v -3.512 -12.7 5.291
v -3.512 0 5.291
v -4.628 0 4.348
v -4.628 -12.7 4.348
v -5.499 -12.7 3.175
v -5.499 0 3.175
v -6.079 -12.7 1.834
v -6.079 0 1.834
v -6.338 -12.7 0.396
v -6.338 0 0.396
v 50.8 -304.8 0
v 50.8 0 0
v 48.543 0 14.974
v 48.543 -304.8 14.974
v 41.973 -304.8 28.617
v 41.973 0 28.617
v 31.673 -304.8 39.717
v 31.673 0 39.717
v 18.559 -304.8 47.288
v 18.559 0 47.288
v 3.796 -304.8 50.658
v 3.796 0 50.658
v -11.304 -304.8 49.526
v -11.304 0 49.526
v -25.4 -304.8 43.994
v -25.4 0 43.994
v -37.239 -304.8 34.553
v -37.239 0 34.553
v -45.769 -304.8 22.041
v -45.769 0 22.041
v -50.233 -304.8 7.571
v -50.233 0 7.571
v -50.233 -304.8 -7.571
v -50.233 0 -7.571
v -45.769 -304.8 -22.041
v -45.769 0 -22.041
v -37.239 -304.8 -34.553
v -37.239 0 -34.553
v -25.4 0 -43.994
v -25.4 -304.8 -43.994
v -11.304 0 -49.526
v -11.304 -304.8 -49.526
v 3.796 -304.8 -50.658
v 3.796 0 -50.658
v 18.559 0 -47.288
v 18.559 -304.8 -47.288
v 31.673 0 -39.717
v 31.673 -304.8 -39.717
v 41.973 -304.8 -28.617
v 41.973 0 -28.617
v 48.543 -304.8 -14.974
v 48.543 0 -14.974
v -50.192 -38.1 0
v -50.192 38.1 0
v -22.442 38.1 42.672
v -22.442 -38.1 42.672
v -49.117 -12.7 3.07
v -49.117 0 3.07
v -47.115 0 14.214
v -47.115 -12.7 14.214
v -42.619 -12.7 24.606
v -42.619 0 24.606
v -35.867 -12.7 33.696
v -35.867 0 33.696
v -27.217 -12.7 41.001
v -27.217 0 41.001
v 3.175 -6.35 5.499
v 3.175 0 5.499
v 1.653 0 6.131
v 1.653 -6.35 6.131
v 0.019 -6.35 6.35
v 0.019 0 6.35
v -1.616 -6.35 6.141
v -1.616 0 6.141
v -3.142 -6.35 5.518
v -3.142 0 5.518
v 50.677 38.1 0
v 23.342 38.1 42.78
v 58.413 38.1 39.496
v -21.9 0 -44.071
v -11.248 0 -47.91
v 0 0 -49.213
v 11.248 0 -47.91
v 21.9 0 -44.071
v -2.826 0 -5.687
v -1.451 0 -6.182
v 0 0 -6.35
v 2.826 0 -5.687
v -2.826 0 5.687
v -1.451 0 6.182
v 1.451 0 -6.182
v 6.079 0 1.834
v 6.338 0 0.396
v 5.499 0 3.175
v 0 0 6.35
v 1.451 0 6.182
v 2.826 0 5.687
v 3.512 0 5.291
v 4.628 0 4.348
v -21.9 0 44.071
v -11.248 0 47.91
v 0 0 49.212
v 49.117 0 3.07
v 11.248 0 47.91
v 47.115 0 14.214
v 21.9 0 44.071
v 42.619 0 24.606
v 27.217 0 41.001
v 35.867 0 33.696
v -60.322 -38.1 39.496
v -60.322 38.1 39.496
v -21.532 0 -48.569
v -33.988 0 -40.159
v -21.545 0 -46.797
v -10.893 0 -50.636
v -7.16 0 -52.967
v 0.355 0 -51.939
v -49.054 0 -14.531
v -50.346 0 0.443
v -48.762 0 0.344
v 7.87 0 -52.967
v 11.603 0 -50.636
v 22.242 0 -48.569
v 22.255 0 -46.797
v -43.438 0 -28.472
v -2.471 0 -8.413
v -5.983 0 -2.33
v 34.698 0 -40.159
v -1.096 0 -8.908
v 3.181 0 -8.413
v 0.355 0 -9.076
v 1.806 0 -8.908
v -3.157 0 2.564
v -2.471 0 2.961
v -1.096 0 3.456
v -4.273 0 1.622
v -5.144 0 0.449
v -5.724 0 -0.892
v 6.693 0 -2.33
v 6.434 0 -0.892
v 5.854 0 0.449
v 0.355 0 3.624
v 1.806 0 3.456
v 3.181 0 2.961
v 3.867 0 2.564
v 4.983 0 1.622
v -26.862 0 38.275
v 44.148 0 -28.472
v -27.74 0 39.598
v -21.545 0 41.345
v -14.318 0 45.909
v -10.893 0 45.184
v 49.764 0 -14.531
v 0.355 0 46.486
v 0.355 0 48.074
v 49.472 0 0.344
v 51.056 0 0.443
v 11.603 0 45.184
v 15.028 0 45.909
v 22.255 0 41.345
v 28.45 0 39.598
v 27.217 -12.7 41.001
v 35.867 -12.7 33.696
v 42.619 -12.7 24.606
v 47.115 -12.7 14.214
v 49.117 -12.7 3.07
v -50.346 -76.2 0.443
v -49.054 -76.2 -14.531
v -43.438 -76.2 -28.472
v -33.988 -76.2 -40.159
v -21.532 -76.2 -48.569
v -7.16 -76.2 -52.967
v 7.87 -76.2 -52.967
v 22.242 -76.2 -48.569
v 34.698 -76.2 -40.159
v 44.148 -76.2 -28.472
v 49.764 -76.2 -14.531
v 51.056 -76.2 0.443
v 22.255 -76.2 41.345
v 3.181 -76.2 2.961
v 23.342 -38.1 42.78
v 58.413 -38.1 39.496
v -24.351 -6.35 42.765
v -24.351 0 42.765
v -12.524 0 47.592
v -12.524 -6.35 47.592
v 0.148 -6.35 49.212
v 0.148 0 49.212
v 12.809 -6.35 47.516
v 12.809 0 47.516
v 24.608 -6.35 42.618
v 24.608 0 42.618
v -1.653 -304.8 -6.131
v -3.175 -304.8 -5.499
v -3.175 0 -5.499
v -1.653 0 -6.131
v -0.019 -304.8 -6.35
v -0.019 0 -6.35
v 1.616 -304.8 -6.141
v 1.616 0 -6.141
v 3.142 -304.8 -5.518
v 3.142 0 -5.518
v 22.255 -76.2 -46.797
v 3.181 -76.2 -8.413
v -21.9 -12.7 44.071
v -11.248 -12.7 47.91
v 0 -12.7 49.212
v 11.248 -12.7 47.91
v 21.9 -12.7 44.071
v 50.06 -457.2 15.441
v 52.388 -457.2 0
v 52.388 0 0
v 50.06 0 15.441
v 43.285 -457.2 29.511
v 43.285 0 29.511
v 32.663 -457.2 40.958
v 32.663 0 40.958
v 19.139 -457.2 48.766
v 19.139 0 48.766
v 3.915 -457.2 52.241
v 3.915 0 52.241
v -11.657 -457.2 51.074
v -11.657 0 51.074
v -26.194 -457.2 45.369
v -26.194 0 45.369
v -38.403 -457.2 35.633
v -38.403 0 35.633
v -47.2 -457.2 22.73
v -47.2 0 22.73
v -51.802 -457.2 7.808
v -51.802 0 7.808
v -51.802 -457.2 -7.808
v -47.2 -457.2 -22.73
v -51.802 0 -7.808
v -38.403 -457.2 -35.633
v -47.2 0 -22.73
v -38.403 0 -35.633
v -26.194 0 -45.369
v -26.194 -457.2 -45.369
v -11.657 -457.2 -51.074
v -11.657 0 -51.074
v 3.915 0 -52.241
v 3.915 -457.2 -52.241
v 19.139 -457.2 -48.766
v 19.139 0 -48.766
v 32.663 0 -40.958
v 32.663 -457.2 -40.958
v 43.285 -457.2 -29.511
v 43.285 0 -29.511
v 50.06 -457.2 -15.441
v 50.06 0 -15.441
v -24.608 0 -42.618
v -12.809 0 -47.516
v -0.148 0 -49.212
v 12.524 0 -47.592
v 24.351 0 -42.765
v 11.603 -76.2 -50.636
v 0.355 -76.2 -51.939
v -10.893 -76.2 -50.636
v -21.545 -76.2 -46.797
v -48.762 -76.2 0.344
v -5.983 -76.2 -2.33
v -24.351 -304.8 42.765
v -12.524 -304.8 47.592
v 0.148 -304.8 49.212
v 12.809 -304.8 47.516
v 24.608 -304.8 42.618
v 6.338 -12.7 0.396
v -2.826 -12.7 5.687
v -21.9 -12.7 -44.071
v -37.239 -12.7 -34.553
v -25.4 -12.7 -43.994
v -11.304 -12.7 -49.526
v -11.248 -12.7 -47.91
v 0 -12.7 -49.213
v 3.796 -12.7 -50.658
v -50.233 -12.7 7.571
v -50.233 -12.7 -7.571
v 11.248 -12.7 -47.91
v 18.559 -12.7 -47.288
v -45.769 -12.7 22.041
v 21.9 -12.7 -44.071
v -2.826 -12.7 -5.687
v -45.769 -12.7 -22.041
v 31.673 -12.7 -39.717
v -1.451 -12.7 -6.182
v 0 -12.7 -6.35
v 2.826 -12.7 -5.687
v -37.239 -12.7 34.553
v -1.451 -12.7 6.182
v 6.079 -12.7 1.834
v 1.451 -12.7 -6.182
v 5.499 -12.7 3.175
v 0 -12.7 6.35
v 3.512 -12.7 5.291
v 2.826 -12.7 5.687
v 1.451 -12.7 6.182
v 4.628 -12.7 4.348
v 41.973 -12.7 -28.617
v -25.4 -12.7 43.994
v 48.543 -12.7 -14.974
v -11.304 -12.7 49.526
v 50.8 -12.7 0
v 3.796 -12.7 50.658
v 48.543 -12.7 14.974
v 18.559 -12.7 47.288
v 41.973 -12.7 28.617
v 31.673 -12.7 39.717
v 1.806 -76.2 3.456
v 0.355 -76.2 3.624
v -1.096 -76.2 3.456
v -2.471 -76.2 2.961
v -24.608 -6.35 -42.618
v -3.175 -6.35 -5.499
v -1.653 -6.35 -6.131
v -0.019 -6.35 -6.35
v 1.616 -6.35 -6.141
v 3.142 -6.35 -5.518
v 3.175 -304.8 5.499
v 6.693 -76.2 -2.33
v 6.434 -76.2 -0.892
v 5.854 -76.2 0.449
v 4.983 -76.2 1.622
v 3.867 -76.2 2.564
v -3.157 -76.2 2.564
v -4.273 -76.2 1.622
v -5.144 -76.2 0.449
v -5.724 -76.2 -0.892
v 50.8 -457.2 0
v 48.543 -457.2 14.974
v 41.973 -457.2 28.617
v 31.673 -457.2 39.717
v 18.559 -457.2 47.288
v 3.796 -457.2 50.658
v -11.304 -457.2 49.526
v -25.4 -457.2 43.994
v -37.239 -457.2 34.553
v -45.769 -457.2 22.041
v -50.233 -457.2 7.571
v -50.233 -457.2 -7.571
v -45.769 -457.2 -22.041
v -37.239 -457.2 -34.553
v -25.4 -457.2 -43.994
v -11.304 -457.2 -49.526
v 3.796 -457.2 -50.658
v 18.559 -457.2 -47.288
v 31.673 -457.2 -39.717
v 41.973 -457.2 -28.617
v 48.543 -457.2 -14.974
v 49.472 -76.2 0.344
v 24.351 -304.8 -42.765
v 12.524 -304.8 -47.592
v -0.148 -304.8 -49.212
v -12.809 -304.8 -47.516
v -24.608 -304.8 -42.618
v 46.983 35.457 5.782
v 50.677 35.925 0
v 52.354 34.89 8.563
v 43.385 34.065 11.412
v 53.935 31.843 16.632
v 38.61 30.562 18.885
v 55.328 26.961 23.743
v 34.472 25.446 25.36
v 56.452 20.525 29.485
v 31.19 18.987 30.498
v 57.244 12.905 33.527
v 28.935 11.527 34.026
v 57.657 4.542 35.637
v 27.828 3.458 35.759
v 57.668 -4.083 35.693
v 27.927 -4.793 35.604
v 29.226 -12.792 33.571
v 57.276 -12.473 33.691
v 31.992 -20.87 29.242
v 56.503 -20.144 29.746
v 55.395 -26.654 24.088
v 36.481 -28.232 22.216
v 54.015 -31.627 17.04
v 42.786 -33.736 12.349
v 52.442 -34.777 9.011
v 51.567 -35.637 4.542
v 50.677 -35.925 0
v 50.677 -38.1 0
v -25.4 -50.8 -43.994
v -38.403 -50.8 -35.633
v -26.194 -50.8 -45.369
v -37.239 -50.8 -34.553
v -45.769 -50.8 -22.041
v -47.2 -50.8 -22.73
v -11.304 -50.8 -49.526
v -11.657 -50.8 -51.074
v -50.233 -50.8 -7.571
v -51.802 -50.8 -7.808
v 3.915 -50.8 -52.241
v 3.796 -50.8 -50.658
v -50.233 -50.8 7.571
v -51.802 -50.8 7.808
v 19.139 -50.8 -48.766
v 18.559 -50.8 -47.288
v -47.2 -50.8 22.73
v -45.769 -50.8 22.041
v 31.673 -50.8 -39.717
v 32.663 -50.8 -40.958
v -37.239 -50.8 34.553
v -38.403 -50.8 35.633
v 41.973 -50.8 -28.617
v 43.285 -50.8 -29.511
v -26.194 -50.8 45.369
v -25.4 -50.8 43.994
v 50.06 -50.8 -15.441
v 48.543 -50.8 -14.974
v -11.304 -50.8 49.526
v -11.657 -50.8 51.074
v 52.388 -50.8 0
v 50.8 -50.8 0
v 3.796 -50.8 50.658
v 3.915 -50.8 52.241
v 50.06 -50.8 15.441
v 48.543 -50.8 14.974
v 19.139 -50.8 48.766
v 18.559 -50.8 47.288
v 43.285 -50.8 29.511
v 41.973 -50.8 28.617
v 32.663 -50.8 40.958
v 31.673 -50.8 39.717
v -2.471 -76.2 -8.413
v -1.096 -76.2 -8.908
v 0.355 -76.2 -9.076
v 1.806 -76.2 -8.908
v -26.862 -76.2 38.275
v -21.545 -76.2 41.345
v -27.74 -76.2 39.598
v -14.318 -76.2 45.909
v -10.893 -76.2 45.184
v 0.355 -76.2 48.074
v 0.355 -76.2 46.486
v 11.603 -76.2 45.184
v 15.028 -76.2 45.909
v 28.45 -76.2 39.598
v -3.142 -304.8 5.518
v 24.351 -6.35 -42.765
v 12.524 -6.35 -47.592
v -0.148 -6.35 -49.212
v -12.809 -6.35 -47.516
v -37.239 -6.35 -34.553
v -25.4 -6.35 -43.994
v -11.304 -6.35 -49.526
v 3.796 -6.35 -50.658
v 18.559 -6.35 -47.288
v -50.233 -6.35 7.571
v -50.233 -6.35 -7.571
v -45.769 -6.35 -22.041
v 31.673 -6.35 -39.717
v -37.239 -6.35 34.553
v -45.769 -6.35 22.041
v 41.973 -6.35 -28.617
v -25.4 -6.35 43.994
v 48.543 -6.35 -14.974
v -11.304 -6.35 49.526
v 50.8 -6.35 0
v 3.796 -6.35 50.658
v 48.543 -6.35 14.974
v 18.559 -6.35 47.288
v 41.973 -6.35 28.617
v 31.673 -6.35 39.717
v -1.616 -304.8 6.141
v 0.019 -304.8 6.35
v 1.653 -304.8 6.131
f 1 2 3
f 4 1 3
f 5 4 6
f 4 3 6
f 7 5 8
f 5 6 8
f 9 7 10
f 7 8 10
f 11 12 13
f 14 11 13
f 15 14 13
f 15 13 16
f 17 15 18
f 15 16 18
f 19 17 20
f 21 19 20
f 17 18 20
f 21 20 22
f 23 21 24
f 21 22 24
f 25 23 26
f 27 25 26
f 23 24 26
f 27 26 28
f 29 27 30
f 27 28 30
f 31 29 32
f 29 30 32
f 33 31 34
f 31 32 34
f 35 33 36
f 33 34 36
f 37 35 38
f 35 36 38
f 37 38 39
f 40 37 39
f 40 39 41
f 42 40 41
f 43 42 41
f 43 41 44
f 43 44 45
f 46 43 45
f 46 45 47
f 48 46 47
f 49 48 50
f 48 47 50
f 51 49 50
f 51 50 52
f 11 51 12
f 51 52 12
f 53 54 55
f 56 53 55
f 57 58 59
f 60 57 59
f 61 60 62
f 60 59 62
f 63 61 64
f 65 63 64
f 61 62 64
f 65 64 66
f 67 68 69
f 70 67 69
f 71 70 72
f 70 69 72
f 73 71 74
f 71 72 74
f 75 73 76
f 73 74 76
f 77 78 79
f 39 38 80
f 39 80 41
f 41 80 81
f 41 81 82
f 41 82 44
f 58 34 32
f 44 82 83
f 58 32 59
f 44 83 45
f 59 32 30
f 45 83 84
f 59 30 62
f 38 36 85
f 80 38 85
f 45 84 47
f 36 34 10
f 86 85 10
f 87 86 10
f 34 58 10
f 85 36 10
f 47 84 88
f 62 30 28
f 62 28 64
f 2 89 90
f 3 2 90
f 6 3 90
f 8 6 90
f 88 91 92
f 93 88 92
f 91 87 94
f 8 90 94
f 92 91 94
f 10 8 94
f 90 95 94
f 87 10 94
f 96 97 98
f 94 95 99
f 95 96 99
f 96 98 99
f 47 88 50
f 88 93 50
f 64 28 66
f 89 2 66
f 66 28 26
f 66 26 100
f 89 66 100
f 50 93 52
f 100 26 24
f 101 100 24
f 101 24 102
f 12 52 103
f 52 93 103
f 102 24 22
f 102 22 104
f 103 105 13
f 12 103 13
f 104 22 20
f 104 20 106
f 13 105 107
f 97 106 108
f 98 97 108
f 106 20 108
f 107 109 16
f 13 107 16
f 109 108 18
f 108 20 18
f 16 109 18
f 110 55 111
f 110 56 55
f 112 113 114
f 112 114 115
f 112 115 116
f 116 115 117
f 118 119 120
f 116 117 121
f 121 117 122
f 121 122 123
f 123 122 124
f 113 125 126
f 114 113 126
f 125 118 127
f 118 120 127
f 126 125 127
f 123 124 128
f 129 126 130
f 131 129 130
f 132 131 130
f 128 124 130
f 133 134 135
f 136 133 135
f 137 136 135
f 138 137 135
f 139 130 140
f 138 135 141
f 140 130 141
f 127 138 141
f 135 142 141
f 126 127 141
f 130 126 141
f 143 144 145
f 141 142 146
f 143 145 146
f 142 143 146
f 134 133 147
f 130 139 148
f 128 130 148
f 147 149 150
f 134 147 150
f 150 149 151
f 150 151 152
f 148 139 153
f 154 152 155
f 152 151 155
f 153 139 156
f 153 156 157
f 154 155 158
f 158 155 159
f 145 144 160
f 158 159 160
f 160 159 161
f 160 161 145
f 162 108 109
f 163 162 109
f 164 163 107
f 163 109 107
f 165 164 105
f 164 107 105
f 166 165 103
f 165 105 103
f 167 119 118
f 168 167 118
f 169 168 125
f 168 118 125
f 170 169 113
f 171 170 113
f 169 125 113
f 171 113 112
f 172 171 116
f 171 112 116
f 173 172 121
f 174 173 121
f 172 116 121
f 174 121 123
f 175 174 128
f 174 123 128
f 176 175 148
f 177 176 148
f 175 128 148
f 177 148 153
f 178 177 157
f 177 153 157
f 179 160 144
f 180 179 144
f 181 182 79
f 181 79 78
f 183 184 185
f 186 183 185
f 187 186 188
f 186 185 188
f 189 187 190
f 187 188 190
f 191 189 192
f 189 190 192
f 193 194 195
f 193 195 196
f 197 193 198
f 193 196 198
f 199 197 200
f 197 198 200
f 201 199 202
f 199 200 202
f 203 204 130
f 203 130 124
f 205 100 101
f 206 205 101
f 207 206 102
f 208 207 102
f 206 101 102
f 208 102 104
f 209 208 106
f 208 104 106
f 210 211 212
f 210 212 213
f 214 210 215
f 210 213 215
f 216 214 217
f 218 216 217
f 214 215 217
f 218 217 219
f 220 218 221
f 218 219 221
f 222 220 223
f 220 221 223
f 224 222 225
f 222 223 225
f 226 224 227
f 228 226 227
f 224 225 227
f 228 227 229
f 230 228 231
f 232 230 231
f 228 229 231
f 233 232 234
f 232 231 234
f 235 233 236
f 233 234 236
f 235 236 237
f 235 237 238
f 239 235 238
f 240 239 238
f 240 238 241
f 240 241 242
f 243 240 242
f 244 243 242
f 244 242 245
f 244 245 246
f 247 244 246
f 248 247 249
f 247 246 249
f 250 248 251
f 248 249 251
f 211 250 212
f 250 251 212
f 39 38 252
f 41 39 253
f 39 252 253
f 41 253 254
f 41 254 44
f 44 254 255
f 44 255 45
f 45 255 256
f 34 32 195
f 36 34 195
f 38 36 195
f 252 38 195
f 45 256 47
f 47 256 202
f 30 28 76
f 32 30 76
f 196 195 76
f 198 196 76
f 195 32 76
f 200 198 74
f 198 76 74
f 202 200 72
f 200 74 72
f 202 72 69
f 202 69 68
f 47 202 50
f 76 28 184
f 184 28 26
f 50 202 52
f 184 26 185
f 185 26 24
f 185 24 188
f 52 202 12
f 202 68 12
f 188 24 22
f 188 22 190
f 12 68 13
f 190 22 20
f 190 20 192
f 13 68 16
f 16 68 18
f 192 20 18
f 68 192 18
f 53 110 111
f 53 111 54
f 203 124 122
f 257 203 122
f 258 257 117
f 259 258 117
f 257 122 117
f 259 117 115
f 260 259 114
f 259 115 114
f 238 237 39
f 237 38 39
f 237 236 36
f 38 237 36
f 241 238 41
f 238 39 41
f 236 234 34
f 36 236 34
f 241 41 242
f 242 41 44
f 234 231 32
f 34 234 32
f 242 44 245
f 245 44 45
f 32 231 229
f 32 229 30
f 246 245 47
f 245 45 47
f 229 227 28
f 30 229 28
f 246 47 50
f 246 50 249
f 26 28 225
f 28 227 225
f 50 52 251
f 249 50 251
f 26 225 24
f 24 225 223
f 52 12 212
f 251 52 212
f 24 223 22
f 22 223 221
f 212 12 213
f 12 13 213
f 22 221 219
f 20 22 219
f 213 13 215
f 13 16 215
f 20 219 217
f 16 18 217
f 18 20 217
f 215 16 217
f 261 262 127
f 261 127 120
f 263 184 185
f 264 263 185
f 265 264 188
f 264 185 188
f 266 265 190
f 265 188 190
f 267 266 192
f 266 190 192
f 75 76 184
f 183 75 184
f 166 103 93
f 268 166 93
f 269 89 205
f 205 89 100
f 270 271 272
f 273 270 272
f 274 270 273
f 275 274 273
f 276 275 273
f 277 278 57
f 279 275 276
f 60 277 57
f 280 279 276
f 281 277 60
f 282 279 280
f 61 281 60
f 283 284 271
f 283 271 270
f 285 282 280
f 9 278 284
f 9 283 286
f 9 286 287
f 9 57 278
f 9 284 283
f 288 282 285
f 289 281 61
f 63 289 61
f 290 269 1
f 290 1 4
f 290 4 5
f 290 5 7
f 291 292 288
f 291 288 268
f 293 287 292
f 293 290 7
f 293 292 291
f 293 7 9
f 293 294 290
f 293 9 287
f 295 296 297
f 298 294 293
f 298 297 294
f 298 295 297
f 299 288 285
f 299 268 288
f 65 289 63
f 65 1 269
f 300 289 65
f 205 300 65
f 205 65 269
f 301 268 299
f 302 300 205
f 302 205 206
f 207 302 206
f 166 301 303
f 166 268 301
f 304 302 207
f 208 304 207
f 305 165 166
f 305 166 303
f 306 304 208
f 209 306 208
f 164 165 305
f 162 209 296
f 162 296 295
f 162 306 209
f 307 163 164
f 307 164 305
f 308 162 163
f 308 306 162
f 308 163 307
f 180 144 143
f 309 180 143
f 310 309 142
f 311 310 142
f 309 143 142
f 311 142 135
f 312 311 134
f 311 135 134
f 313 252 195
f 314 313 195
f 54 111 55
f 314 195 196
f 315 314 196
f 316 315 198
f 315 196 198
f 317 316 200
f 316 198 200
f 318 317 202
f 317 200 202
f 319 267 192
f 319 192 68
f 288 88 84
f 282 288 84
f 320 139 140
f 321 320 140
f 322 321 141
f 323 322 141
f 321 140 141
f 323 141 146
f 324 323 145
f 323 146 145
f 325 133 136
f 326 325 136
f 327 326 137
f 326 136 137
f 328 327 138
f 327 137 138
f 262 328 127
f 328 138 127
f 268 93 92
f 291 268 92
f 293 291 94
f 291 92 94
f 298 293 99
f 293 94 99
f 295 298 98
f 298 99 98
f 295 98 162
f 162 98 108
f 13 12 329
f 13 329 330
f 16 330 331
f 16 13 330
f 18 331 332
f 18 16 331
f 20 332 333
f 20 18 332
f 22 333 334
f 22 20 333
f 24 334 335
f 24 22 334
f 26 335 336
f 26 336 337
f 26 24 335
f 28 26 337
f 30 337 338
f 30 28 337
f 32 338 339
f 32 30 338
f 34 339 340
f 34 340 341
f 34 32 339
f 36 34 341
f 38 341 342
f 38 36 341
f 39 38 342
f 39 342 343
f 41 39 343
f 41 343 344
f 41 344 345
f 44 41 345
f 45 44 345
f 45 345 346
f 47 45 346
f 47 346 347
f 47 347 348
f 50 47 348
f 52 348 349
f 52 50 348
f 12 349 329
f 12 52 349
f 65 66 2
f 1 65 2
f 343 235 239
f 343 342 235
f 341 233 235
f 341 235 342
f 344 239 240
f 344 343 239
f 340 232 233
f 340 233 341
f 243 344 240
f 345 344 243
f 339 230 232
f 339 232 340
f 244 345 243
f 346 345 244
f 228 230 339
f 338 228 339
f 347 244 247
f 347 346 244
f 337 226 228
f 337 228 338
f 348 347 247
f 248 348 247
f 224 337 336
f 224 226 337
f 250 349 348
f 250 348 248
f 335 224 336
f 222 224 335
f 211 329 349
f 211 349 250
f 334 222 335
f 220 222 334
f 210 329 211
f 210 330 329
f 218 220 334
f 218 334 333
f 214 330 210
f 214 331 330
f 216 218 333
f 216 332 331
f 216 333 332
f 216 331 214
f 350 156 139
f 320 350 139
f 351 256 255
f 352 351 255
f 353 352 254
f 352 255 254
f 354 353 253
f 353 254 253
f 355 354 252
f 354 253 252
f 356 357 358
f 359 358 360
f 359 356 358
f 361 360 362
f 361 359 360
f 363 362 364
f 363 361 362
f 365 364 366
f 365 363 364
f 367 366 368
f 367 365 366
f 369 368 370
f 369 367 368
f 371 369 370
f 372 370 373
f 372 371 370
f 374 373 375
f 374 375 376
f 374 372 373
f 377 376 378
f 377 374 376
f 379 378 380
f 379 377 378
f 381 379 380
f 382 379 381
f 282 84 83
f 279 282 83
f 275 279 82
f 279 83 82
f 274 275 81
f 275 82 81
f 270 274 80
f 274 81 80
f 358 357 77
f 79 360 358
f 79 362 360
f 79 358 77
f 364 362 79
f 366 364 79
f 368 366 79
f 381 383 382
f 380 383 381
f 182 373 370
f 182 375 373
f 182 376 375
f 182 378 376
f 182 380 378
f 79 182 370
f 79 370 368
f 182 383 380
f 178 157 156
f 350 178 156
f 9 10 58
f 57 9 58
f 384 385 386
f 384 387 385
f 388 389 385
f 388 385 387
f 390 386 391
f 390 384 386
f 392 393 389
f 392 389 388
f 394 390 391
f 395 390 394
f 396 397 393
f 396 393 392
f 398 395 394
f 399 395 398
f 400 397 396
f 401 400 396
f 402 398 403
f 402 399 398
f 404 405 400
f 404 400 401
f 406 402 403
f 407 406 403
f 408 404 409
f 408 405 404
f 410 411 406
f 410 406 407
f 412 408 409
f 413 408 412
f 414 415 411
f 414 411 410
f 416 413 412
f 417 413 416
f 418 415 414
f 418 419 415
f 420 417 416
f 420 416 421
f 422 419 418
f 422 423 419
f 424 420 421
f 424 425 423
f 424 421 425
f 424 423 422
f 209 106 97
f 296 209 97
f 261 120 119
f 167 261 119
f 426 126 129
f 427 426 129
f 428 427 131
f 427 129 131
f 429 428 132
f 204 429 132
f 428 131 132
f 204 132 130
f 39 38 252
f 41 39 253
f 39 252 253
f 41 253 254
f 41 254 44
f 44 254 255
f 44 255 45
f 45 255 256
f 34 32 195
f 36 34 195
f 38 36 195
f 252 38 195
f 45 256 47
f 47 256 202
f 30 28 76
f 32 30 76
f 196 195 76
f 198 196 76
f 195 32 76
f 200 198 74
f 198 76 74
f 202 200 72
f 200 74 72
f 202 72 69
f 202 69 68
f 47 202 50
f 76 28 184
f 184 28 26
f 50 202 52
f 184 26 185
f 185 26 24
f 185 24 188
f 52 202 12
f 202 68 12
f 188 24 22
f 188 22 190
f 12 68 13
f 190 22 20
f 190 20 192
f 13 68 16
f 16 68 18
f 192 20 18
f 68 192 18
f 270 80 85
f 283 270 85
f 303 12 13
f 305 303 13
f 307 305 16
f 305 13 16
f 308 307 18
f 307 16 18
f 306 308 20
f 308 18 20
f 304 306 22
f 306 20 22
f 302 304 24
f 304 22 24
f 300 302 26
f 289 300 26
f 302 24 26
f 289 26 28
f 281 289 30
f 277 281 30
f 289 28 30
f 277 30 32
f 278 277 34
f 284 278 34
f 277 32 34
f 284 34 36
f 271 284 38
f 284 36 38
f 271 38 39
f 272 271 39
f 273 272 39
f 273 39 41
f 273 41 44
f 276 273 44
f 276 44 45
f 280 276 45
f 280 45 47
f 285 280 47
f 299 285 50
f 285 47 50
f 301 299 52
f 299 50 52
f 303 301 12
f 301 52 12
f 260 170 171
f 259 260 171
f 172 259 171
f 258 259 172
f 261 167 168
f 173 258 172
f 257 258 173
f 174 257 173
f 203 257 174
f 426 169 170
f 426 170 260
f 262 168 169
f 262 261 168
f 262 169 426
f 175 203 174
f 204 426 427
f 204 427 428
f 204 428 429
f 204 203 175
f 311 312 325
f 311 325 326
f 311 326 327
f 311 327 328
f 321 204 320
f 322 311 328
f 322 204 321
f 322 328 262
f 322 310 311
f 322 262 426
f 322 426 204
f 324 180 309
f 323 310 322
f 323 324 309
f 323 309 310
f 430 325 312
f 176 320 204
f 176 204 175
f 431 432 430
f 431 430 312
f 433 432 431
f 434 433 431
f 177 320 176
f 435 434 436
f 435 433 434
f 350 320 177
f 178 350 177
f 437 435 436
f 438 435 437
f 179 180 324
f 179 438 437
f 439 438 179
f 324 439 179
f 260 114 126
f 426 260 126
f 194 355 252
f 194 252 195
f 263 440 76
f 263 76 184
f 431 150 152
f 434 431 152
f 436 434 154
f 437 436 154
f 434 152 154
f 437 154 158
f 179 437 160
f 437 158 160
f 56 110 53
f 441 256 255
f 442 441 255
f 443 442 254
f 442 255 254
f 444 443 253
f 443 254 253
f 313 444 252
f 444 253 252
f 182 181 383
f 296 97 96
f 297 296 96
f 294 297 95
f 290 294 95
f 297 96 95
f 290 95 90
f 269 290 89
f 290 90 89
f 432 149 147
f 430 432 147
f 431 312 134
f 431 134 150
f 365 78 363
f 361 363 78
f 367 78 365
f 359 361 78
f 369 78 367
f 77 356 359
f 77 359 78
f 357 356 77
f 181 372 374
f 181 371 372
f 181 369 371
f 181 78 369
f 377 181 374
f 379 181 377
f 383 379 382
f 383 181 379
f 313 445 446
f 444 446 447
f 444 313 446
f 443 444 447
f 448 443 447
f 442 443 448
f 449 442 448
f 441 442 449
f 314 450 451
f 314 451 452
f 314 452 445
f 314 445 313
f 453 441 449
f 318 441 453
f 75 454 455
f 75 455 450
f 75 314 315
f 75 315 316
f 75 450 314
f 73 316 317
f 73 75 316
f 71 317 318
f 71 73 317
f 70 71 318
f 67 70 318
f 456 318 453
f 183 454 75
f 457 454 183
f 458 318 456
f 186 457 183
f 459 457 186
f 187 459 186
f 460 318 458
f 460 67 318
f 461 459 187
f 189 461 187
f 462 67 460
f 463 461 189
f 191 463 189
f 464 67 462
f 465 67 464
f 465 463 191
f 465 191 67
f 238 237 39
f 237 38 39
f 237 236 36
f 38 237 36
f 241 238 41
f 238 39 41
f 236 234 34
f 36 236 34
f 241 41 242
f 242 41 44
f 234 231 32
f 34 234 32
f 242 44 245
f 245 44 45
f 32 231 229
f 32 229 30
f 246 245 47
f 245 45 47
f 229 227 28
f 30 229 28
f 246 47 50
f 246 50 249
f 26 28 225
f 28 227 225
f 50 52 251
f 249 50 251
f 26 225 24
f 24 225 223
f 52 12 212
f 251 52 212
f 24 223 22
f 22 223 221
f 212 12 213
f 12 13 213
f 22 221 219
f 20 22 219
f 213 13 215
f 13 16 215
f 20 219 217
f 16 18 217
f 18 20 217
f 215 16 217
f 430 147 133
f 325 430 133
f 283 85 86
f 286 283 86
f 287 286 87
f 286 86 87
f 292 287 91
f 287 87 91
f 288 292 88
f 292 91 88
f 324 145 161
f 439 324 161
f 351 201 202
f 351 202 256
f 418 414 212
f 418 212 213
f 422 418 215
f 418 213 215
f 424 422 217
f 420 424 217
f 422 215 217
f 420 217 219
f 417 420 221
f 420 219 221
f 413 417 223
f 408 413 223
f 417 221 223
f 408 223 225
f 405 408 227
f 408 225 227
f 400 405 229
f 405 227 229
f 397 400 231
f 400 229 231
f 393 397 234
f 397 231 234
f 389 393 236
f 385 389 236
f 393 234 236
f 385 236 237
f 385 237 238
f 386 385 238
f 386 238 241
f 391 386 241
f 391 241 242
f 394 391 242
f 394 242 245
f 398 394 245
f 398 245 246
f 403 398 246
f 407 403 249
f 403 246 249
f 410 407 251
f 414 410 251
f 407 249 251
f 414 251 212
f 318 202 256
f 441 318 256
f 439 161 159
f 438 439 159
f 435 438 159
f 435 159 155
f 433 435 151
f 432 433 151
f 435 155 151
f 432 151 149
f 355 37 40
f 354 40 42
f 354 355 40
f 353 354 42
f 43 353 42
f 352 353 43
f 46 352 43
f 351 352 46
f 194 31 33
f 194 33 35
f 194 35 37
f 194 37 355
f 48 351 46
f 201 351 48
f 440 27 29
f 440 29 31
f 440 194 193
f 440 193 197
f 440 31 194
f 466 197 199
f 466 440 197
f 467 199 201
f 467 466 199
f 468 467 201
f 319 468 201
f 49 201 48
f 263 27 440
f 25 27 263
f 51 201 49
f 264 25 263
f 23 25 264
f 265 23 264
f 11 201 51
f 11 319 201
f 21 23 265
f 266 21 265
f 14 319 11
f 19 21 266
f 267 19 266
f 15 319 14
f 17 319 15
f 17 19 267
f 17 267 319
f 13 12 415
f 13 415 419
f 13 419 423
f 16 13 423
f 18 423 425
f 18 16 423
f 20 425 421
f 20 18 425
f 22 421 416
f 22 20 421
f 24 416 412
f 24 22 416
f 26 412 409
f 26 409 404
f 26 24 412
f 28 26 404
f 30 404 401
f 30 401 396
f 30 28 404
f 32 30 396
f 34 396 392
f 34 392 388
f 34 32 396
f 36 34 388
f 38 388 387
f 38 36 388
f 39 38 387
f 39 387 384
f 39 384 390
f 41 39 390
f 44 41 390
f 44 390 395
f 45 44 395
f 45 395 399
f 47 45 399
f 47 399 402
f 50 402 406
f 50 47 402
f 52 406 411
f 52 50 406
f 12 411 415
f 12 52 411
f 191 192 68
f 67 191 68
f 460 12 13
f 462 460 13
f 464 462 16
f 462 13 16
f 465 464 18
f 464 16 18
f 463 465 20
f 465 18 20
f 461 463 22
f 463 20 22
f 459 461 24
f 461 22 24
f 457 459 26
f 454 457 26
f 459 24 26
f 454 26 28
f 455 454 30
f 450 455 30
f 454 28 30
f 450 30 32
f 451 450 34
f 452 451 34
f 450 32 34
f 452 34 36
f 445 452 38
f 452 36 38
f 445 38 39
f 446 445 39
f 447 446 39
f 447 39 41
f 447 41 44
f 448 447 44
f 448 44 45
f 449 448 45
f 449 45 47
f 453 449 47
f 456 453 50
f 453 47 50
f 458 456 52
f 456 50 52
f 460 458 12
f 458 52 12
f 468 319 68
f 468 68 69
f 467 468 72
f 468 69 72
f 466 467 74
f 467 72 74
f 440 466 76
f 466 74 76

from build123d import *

# Parameters (mm, degrees)
F0_R      = 50.8
F1_DEPTH  = 12.7
F2_R      = 50.8
F3_DEPTH  = 304.8
F5_DEPTH  = 76.2
F6_DEPTH  = 6.35
F7_R      = 52.3875
F7_R_2    = 50.8
F8_DEPTH  = 457.2
F9_DEPTH  = 50.8
F11_DEPTH = 38.1
F13_DEPTH = 58.4137828479


with BuildPart() as f1:
    # F0 (on Front) → F1 (new body)
    with BuildSketch(Plane.XZ):
        Circle(F0_R)
        with BuildLine():
            ThreePointArc((-2.8257822299, -5.6866030976), (1.766e-07, -6.35), (2.8257825462, -5.6866029404))
            Line((2.8257825462, -5.6866029404), (21.8998147334, -44.0711727878))
            ThreePointArc((21.8998147334, -44.0711727878), (1.3688e-06, -49.2125), (-21.8998122818, -44.0711740061))
            Line((-21.8998122818, -44.0711740061), (-2.8257822299, -5.6866030976))
        make_face(mode=Mode.SUBTRACT)
        with BuildLine():
            Line((-27.2168516436, 41.0013797678), (-3.511851825, 5.2905006152))
            ThreePointArc((-3.511851825, 5.2905006152), (-5.4992615201, 3.1749996431), (-6.3376338954, 0.3961017645))
            Line((-6.3376338954, 0.3961017645), (-49.1166626894, 3.0697886751))
            ThreePointArc((-49.1166626894, 3.0697886751), (-42.6192767807, 24.606247234), (-27.2168516436, 41.0013797678))
        make_face(mode=Mode.SUBTRACT)
        with BuildLine():
            ThreePointArc((2.8257819136, 5.6866032548), (-5.299e-07, 6.35), (-2.8257828626, 5.6866027832))
            Line((-2.8257828626, 5.6866027832), (-21.899817185, 44.0711715696))
            ThreePointArc((-21.899817185, 44.0711715696), (-4.1064e-06, 49.2125), (21.8998098301, 44.0711752243))
            Line((21.8998098301, 44.0711752243), (2.8257819136, 5.6866032548))
        make_face(mode=Mode.SUBTRACT)
        with BuildLine():
            ThreePointArc((27.216844801, 41.0013843099), (42.6192740431, 24.6062519757), (49.1166625186, 3.0697914074))
            Line((49.1166625186, 3.0697914074), (6.3376338734, 0.3961021171))
            ThreePointArc((6.3376338734, 0.3961021171), (5.4992611668, 3.1750002549), (3.5118509421, 5.2905012013))
            Line((3.5118509421, 5.2905012013), (27.216844801, 41.0013843099))
        make_face(mode=Mode.SUBTRACT)
    extrude(amount=F1_DEPTH)


with BuildPart() as f3:
    # F2 (on Front) → F3 (new body)
    with BuildSketch(Plane.XZ):
        Circle(F2_R)
        with BuildLine():
            ThreePointArc((24.3512589376, -42.7654807573), (-0.1478803566, -49.2122778141), (-24.6078329789, -42.6183612112))
            Line((-24.6078329789, -42.6183612112), (-3.1752042553, -5.4991433821))
            ThreePointArc((-3.1752042553, -5.4991433821), (-0.0190813363, -6.3499713308), (3.1420979274, -5.5181265493))
            Line((3.1420979274, -5.5181265493), (24.3512589376, -42.7654807573))
        make_face(mode=Mode.SUBTRACT)
        with BuildLine():
            Line((24.6078329789, 42.6183612112), (3.1752042553, 5.4991433821))
            ThreePointArc((3.1752042553, 5.4991433821), (0.0190813363, 6.3499713308), (-3.1420979274, 5.5181265493))
            Line((-3.1420979274, 5.5181265493), (-24.3512589376, 42.7654807573))
            ThreePointArc((-24.3512589376, 42.7654807573), (0.1478803566, 49.2122778141), (24.6078329789, 42.6183612112))
        make_face(mode=Mode.SUBTRACT)
    extrude(amount=F3_DEPTH)


with BuildPart() as f5:
    # F4 (on Front) → F5 (new body)
    with BuildSketch(Plane.XZ):
        with BuildLine():
            ThreePointArc((-21.5448017816, -46.7972523877), (-42.2642635429, -27.3323303573), (-48.7616521892, 0.3437102935))
            Line((-48.7616521892, 0.3437102935), (-50.346060663, 0.4427357347))
            ThreePointArc((-50.346060663, 0.4427357347), (0.3550119132, -53.5260783816), (51.0560814871, 0.4427385551))
            Line((51.0560814871, 0.4427385551), (49.4716730188, 0.3437130258))
            ThreePointArc((49.4716730188, 0.3437130258), (42.9742859121, -27.3323279864), (22.2548252336, -46.7972511694))
            ThreePointArc((22.2548252336, -46.7972511694), (0.355011869, -51.9385783816), (-21.5448017816, -46.7972523877))
        make_face()
        with BuildLine():
            Line((-26.8618411434, 38.2753013862), (-3.1568413248, 2.5644222336))
            ThreePointArc((-3.1568413248, 2.5644222336), (-5.1442510199, 0.4489212615), (-5.9826233952, -2.3299766171))
            Line((-5.9826233952, -2.3299766171), (-48.7616521892, 0.3437102935))
            ThreePointArc((-48.7616521892, 0.3437102935), (-42.2642635429, -27.3323303573), (-21.5448017816, -46.7972523877))
            Line((-21.5448017816, -46.7972523877), (-2.4707717297, -8.4126814791))
            ThreePointArc((-2.4707717297, -8.4126814791), (0.3550106768, -9.0760783816), (3.1807930464, -8.412681322))
            Line((3.1807930464, -8.412681322), (22.2548252336, -46.7972511694))
            ThreePointArc((22.2548252336, -46.7972511694), (42.9742859121, -27.3323279864), (49.4716730188, 0.3437130258))
            Line((49.4716730188, 0.3437130258), (6.6926443736, -2.3299762645))
            ThreePointArc((6.6926443736, -2.3299762645), (5.854271667, 0.4489218733), (3.8668614423, 2.5644228197))
            Line((3.8668614423, 2.5644228197), (28.4498180367, 39.5979312286))
            ThreePointArc((28.4498180367, 39.5979312286), (0.3550062613, 48.0739216184), (-27.7398040996, 39.59792654))
            Line((-27.7398040996, 39.59792654), (-26.8618411434, 38.2753013862))
        make_face()
        with BuildLine():
            ThreePointArc((3.1807924138, 2.9605248732), (0.3550099703, 3.6239216184), (-2.4707723624, 2.9605244016))
            Line((-2.4707723624, 2.9605244016), (-21.5448066848, 41.345093188))
            ThreePointArc((-21.5448066848, 41.345093188), (0.3550063938, 46.4864216184), (22.2548203303, 41.3450968427))
            Line((22.2548203303, 41.3450968427), (3.1807924138, 2.9605248732))
        make_face(mode=Mode.SUBTRACT)
    extrude(amount=F5_DEPTH)


with BuildPart() as f6:
    # F2 (on Front) → F6 (new body)
    with BuildSketch(Plane.XZ):
        Circle(F2_R)
        with BuildLine():
            ThreePointArc((24.3512589376, -42.7654807573), (-0.1478803566, -49.2122778141), (-24.6078329789, -42.6183612112))
            Line((-24.6078329789, -42.6183612112), (-3.1752042553, -5.4991433821))
            ThreePointArc((-3.1752042553, -5.4991433821), (-0.0190813363, -6.3499713308), (3.1420979274, -5.5181265493))
            Line((3.1420979274, -5.5181265493), (24.3512589376, -42.7654807573))
        make_face(mode=Mode.SUBTRACT)
        with BuildLine():
            Line((24.6078329789, 42.6183612112), (3.1752042553, 5.4991433821))
            ThreePointArc((3.1752042553, 5.4991433821), (0.0190813363, 6.3499713308), (-3.1420979274, 5.5181265493))
            Line((-3.1420979274, 5.5181265493), (-24.3512589376, 42.7654807573))
            ThreePointArc((-24.3512589376, 42.7654807573), (0.1478803566, 49.2122778141), (24.6078329789, 42.6183612112))
        make_face(mode=Mode.SUBTRACT)
    extrude(amount=F6_DEPTH)


with BuildPart() as f8:
    # F7 (on Front) → F8 (new body)
    with BuildSketch(Plane.XZ):
        Circle(F7_R)
        Circle(F7_R_2, mode=Mode.SUBTRACT)
    extrude(amount=F8_DEPTH)


with BuildPart() as f9:
    # F7 (on Front) → F9 (new body)
    with BuildSketch(Plane.XZ):
        Circle(F7_R)
        Circle(F7_R_2, mode=Mode.SUBTRACT)
    extrude(amount=F9_DEPTH)


with BuildPart() as f11:
    # F10 (on Front) → F11 (new body, symmetric)
    with BuildSketch(Plane.XZ):
        Polygon((50.6772324443, 0), (58.4127828479, 39.4957661629), (23.34170416, 42.7798852324), align=None)
    extrude(amount=F11_DEPTH, both=True)

    # F12 (on Right) → F13 (cut, through all)
    with BuildSketch(Plane.YZ):
        with BuildLine():
            Line((0, 0), (35.9254231564, 0))
            ThreePointArc((35.9254231564, 0), (0, 35.9254231564), (-35.9254231564, 0))
            Line((-35.9254231564, 0), (0, 0))
        make_face()
    extrude(amount=F13_DEPTH, mode=Mode.SUBTRACT)


with BuildPart() as f11b:
    # F10 (on Front) → F11, piece 2 (new body, symmetric)
    with BuildSketch(Plane.XZ):
        Polygon((-22.4420726299, 42.6717028022), (-60.3219270706, 39.4957661629), (-50.1920245588, 0), align=None)
    extrude(amount=F11_DEPTH, both=True)


solid = Compound([f1.part, f3.part, f5.part, f6.part, f8.part, f9.part, f11.part, f11b.part])
